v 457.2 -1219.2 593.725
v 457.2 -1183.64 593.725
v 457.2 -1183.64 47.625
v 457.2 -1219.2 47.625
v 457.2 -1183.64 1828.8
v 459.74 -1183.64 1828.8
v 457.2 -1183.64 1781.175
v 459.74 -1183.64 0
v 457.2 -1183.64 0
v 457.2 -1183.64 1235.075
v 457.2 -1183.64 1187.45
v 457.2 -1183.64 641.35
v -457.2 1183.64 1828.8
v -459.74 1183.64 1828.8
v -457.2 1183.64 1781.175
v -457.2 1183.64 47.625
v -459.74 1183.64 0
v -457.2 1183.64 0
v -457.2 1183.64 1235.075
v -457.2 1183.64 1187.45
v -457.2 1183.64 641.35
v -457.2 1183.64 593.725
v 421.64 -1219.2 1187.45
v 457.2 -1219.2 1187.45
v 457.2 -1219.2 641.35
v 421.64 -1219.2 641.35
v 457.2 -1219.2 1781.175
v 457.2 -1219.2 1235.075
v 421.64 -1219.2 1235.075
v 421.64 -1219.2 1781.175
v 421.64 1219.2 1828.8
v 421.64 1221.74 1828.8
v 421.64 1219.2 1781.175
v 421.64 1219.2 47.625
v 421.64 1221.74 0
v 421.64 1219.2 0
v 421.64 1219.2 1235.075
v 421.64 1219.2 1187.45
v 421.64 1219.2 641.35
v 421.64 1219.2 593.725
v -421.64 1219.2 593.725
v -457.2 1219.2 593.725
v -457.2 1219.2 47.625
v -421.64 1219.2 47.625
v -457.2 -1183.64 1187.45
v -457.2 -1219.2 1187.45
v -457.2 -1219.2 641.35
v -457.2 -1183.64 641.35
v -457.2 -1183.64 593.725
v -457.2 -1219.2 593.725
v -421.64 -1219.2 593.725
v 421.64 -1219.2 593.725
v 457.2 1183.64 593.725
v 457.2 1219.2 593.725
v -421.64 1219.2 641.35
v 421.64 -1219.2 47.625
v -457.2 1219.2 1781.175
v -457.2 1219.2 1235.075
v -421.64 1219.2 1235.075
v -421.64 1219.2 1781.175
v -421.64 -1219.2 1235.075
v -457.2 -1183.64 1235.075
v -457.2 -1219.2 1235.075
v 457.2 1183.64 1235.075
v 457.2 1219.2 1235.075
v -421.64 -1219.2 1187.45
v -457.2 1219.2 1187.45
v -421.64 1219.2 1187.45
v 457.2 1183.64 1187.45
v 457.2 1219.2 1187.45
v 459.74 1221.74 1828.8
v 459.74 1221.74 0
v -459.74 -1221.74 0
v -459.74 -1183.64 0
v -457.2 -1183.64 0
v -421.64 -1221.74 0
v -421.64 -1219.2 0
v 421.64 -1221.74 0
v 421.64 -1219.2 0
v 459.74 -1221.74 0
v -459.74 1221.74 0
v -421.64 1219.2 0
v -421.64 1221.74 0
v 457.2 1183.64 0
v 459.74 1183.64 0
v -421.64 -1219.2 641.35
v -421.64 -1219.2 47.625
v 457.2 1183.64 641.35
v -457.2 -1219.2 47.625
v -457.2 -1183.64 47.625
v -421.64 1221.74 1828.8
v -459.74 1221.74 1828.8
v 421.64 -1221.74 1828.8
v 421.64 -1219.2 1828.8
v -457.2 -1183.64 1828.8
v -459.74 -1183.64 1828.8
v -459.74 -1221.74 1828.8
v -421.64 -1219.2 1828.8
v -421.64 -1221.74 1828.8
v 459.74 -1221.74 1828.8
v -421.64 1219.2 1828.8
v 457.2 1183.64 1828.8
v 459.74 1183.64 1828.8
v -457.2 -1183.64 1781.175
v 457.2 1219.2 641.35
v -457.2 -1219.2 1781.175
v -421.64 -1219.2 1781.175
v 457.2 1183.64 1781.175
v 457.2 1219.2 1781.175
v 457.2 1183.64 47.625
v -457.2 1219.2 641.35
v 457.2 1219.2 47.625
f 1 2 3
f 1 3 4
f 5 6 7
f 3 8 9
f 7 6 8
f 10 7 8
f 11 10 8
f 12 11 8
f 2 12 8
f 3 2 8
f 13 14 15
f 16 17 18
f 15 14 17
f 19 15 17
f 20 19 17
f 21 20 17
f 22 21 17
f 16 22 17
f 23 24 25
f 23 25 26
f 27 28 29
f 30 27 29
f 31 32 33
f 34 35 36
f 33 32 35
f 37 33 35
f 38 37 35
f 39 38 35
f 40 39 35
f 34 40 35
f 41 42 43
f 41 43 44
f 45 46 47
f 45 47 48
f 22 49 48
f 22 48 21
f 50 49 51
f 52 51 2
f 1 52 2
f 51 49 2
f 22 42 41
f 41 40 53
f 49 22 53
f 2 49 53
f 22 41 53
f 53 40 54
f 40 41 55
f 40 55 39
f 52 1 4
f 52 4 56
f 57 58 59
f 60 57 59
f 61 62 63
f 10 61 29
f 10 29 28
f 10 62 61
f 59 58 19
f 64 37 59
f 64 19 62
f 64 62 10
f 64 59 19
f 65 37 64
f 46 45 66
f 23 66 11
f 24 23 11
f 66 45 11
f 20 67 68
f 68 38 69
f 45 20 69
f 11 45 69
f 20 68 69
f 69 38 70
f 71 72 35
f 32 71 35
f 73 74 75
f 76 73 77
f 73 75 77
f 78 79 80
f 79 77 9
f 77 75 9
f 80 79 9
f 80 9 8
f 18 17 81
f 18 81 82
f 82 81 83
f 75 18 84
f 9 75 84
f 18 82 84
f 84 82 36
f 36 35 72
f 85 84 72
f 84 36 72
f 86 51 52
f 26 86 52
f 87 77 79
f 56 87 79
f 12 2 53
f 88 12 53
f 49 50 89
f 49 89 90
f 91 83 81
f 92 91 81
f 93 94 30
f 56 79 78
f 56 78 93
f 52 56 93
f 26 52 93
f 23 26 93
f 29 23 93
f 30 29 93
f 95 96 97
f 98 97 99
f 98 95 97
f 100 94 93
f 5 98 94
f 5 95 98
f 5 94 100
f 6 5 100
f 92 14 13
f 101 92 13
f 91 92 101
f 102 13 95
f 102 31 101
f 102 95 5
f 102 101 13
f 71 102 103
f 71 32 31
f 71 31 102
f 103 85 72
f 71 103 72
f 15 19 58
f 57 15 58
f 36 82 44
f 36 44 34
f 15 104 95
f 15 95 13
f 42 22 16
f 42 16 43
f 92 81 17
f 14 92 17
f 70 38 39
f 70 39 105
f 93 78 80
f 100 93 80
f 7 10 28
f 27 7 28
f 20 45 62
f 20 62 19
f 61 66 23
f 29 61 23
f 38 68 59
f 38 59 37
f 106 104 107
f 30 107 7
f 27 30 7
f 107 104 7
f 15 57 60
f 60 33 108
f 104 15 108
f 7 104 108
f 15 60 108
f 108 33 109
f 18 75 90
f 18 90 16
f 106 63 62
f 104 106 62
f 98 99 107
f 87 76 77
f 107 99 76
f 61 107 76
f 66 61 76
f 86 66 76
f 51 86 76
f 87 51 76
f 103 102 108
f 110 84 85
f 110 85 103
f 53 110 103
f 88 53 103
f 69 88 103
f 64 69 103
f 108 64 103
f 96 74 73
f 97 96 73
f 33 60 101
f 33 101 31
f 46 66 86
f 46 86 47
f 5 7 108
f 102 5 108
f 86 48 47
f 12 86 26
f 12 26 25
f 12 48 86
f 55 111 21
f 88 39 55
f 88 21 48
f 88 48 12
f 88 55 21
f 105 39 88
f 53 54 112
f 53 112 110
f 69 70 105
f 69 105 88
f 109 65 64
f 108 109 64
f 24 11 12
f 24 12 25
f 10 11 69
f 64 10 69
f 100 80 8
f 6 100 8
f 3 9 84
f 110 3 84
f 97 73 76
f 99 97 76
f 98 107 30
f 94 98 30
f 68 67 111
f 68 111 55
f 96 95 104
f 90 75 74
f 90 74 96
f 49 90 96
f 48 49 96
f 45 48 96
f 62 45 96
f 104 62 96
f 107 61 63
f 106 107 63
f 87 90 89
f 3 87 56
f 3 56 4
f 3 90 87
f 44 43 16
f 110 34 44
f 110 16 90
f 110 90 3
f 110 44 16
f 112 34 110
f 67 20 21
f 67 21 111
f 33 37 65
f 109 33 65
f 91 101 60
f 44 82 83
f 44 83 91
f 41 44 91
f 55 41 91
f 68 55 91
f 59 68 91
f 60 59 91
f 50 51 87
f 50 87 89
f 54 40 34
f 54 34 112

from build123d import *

# Parameters (mm, degrees)
F0_W      = 914.4
F0_H      = 2438.4
F1_DEPTH  = 47.625
F3_DEPTH  = 1828.8
F5_W      = 914.4
F5_H      = 2438.4
F6_DEPTH  = 47.625
F8_W      = 914.4
F8_H      = 2438.4
F9_DEPTH  = 47.625
F11_W     = 914.4
F11_H     = 2438.4
F12_DEPTH = 47.625


with BuildPart() as f1:
    # F0 (on Top) → F1 (new body)
    with BuildSketch(Plane.XY):
        Rectangle(F0_W, F0_H)
    extrude(amount=F1_DEPTH)

    # F2 (on Top) → F3 (join)
    with BuildSketch(Plane.XY):
        Polygon((459.74, 1221.74), (421.64, 1221.74), (421.64, 1219.2), (457.2, 1219.2), (457.2, 1183.64), (459.74, 1183.64), align=None)
        Polygon((-421.64, 1221.74), (-459.74, 1221.74), (-459.74, 1183.64), (-457.2, 1183.64), (-457.2, 1219.2), (-421.64, 1219.2), align=None)
        Polygon((421.64, -1219.2), (421.64, -1221.74), (459.74, -1221.74), (459.74, -1183.64), (457.2, -1183.64), (457.2, -1219.2), align=None)
        Polygon((-457.2, -1183.64), (-459.74, -1183.64), (-459.74, -1221.74), (-421.64, -1221.74), (-421.64, -1219.2), (-457.2, -1219.2), align=None)
    extrude(amount=F3_DEPTH)

    # F5 (on offset) → F6 (join)
    with BuildSketch(Plane.XY.offset(593.725)):
        Rectangle(F5_W, F5_H)
    extrude(amount=F6_DEPTH)

    # F8 (on offset) → F9 (join)
    with BuildSketch(Plane.XY.offset(1187.45)):
        Rectangle(F8_W, F8_H)
    extrude(amount=F9_DEPTH)

    # F11 (on offset) → F12 (join)
    with BuildSketch(Plane.XY.offset(1781.175)):
        Rectangle(F11_W, F11_H)
    extrude(amount=F12_DEPTH)


solid = f1.part
